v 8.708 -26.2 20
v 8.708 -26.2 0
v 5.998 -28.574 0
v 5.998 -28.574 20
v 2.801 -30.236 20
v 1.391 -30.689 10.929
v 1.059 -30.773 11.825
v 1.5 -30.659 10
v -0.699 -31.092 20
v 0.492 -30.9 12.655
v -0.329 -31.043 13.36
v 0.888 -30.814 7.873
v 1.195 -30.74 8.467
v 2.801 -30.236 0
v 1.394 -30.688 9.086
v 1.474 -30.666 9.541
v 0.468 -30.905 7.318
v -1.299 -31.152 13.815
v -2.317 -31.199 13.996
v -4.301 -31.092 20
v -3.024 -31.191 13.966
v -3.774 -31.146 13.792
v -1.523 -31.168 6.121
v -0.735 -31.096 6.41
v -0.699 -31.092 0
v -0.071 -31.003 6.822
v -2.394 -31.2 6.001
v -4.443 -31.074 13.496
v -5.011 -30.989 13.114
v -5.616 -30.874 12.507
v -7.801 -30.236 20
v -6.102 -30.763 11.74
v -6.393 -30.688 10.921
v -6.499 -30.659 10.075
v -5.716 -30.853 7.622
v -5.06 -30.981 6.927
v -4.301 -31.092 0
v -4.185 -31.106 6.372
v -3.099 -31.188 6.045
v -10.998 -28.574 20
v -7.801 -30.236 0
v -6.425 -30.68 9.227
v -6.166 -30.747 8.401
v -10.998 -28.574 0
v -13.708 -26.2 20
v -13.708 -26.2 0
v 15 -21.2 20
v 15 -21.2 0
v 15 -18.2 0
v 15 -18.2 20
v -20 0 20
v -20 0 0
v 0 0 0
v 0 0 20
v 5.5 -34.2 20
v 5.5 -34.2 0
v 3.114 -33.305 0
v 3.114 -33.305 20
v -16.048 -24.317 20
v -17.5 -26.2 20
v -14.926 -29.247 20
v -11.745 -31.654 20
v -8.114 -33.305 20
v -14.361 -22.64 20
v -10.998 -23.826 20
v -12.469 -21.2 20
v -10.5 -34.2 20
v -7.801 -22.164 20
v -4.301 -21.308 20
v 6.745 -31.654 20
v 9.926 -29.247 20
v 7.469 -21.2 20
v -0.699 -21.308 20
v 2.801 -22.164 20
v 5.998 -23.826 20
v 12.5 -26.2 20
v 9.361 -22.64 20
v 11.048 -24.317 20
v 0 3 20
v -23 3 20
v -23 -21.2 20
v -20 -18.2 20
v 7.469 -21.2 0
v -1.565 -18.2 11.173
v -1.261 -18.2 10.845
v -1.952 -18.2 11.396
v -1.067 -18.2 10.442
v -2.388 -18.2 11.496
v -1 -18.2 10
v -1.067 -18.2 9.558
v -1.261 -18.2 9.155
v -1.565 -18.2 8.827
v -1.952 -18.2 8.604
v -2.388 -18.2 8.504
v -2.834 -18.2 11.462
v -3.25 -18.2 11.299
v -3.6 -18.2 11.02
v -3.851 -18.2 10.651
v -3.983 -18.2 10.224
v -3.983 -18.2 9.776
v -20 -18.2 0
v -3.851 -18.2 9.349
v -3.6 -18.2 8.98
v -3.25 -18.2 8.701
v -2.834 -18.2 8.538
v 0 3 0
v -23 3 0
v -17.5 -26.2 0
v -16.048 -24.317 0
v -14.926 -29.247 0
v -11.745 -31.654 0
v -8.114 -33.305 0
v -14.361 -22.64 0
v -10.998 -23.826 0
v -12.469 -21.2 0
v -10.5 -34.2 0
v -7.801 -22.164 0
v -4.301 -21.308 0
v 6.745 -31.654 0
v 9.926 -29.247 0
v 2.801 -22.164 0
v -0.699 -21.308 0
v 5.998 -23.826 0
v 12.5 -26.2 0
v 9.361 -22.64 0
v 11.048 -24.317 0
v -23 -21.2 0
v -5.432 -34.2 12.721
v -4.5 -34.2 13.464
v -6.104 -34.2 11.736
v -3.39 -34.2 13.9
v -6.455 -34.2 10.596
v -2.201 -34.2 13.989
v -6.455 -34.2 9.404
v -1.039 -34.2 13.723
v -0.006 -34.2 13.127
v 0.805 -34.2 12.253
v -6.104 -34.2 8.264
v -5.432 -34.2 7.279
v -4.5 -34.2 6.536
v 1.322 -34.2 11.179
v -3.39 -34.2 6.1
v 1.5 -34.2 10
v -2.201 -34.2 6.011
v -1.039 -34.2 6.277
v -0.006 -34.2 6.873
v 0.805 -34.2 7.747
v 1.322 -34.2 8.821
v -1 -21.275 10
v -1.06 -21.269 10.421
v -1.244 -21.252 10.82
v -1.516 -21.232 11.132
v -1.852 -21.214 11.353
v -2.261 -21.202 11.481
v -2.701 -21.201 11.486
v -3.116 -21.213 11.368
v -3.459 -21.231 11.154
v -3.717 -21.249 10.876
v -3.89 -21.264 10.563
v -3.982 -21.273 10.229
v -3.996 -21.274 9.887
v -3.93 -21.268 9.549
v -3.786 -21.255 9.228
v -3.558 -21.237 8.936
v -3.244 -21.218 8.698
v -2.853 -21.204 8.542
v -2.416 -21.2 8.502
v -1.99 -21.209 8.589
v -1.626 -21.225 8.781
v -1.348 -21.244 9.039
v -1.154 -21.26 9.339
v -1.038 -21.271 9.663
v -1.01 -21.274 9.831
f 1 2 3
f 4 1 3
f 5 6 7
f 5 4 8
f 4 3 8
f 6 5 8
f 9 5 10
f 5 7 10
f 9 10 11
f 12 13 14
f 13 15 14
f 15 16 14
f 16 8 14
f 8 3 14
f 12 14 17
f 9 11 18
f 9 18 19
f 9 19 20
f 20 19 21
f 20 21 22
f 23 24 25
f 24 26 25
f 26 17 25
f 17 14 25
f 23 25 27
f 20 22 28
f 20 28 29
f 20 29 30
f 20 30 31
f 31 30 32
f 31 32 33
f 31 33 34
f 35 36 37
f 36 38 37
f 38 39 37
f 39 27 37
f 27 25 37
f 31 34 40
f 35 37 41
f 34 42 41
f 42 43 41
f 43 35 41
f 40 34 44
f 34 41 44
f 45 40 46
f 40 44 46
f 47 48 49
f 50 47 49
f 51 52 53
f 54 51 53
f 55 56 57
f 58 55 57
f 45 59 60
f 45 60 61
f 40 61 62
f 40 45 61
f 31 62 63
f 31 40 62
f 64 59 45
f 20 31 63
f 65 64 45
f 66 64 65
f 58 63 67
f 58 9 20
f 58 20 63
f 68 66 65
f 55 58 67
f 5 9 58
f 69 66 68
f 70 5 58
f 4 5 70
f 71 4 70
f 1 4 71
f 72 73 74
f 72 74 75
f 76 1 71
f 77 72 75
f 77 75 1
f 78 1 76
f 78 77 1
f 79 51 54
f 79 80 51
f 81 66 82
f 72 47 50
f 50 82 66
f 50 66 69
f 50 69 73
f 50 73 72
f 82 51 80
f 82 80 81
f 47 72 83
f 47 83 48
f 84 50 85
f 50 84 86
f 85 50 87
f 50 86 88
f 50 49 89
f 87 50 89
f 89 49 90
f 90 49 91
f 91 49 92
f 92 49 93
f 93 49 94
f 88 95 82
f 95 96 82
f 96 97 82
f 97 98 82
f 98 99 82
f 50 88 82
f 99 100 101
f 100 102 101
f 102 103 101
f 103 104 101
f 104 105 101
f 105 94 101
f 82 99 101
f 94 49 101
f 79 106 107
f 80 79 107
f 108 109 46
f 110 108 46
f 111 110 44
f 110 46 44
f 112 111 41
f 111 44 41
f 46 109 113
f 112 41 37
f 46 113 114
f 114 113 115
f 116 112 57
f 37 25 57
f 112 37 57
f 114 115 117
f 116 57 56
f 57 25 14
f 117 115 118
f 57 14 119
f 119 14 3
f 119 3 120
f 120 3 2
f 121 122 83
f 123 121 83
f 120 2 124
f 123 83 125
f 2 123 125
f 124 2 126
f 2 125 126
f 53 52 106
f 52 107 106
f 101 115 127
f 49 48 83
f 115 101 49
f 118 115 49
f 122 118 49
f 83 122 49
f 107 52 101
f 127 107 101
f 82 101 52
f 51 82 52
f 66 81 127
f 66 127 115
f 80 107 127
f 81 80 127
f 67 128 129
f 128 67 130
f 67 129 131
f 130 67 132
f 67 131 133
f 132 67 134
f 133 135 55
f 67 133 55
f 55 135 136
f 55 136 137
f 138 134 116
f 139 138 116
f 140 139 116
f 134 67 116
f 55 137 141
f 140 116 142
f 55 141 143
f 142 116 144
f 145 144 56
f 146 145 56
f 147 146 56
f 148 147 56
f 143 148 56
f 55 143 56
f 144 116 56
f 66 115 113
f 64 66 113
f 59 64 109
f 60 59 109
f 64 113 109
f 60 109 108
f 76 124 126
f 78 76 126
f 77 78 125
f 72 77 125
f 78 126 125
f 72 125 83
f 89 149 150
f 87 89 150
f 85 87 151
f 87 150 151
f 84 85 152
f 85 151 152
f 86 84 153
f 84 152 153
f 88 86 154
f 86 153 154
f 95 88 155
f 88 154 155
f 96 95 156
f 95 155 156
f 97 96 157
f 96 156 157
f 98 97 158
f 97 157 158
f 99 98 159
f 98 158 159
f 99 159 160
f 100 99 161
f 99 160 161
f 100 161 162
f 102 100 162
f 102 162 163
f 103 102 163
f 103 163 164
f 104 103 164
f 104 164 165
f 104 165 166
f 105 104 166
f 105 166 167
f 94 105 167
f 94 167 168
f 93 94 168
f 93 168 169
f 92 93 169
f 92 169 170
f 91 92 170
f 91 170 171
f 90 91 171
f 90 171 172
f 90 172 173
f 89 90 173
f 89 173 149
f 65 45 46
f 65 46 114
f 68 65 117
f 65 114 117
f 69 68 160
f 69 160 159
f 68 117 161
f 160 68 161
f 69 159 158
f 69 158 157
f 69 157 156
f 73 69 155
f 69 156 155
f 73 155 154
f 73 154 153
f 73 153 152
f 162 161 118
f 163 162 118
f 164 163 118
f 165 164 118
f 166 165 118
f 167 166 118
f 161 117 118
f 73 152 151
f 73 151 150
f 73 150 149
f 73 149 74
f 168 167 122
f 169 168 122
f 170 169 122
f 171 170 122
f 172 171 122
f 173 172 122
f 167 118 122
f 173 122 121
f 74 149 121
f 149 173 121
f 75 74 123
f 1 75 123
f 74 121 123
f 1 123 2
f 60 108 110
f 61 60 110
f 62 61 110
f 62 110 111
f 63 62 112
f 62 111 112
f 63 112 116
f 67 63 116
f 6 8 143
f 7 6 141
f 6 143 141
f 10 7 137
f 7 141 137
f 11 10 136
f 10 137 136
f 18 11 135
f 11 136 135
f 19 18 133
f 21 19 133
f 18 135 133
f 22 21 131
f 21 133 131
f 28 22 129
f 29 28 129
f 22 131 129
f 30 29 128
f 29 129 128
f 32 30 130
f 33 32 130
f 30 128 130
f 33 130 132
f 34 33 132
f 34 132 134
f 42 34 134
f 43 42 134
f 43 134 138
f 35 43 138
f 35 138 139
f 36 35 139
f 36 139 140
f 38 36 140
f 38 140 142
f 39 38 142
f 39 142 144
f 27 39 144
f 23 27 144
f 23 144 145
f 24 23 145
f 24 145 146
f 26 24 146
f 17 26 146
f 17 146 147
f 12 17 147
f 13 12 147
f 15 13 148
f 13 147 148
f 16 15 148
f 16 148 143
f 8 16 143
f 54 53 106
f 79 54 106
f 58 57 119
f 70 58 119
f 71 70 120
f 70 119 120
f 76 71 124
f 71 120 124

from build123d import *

# Parameters (mm, degrees)
F1_DEPTH = 20
F2_R     = 4
F2_R_2   = 1.5
F3_DEPTH = 4
F4_DEPTH = 25


with BuildPart() as f1:
    # F0 (on Top) → F1 (new body)
    with BuildSketch(Plane.XY):
        with BuildLine():
            Line((-20, 0), (0, 0))
            Line((0, 0), (0, 3))
            Line((0, 3), (-23, 3))
            Line((-23, 3), (-23, -21.2))
            Line((-23, -21.2), (-12.4687010187, -21.2))
            ThreePointArc((-12.4687010187, -21.2), (-7.7051657034, -18.9662531166), (-2.5, -18.2))
            Line((-2.5, -18.2), (-20, -18.2))
            Line((-20, -18.2), (-20, 0))
        make_face()
        with BuildLine():
            ThreePointArc((7.4687010187, -21.2), (2.7051657034, -18.9662531166), (-2.5, -18.2))
            ThreePointArc((-2.5, -18.2), (-7.7051657034, -18.9662531166), (-12.4687010187, -21.2))
            Line((-12.4687010187, -21.2), (-2.5000000655, -21.2))
            Line((-2.5000000655, -21.2), (7.4687010187, -21.2))
        make_face()
        with BuildLine():
            Line((15, -18.2), (-2.5, -18.2))
            ThreePointArc((-2.5, -18.2), (2.7051657034, -18.9662531166), (7.4687010187, -21.2))
            Line((7.4687010187, -21.2), (15, -21.2))
            Line((15, -21.2), (15, -18.2))
        make_face()
        with BuildLine():
            ThreePointArc((12.5, -26.2), (10.2322035658, -23.4505954339), (7.4687010187, -21.2))
            Line((7.4687010187, -21.2), (-2.5000000655, -21.2))
            ThreePointArc((-2.5000000655, -21.2), (3.6364688244, -22.5066773559), (8.7082558857, -26.2))
            ThreePointArc((8.7082558857, -26.2), (3.6364688543, -29.8933226308), (-2.5, -31.2))
            Line((-2.5, -31.2), (3.1142186431, -33.3053319912))
            ThreePointArc((3.1142186431, -33.3053319912), (8.4021987802, -30.538748835), (12.5, -26.2))
        make_face()
        with BuildLine():
            ThreePointArc((-2.5, -34.2), (0.3425288837, -33.974930751), (3.1142186431, -33.3053319912))
            Line((3.1142186431, -33.3053319912), (-2.5, -31.2))
            Line((-2.5, -31.2), (-8.1142186431, -33.3053319912))
            ThreePointArc((-8.1142186431, -33.3053319912), (-5.3425288837, -33.974930751), (-2.5, -34.2))
        make_face()
        with BuildLine():
            Line((-2.5000000655, -21.2), (-12.4687010187, -21.2))
            ThreePointArc((-12.4687010187, -21.2), (-15.2322035658, -23.4505954339), (-17.5, -26.2))
            ThreePointArc((-17.5, -26.2), (-13.4021987802, -30.538748835), (-8.1142186431, -33.3053319912))
            Line((-8.1142186431, -33.3053319912), (-2.5, -31.2))
            ThreePointArc((-2.5, -31.2), (-8.6364688543, -29.8933226308), (-13.7082558857, -26.2))
            ThreePointArc((-13.7082558857, -26.2), (-8.6364688842, -22.5066773825), (-2.5000000655, -21.2))
        make_face()
        with BuildLine():
            ThreePointArc((-2.5, -34.2), (-5.3425288837, -33.974930751), (-8.1142186431, -33.3053319912))
            Line((-8.1142186431, -33.3053319912), (-10.5, -34.2))
            Line((-10.5, -34.2), (-2.5, -34.2))
        make_face()
        with BuildLine():
            Line((5.5, -34.2), (3.1142186431, -33.3053319912))
            ThreePointArc((3.1142186431, -33.3053319912), (0.3425288837, -33.974930751), (-2.5, -34.2))
            Line((-2.5, -34.2), (5.5, -34.2))
        make_face()
    extrude(amount=F1_DEPTH)

    # F2 (on face) → F3 (cut)
    with BuildSketch(Plane.XZ.offset(34.2)):
        with Locations((-2.5, 10)):
            Circle(F2_R)
        with Locations((-2.5, 10)):
            Circle(F2_R_2, mode=Mode.SUBTRACT)
    extrude(amount=-F3_DEPTH, mode=Mode.SUBTRACT)

    # F4 (cut): a face of the model
    f4_faces = [f1.faces().sort_by_distance(p)[0] for p in [
        (-2.5, -34.2, 10),
    ]]
    extrude(f4_faces, amount=-F4_DEPTH, mode=Mode.SUBTRACT)


solid = f1.part
